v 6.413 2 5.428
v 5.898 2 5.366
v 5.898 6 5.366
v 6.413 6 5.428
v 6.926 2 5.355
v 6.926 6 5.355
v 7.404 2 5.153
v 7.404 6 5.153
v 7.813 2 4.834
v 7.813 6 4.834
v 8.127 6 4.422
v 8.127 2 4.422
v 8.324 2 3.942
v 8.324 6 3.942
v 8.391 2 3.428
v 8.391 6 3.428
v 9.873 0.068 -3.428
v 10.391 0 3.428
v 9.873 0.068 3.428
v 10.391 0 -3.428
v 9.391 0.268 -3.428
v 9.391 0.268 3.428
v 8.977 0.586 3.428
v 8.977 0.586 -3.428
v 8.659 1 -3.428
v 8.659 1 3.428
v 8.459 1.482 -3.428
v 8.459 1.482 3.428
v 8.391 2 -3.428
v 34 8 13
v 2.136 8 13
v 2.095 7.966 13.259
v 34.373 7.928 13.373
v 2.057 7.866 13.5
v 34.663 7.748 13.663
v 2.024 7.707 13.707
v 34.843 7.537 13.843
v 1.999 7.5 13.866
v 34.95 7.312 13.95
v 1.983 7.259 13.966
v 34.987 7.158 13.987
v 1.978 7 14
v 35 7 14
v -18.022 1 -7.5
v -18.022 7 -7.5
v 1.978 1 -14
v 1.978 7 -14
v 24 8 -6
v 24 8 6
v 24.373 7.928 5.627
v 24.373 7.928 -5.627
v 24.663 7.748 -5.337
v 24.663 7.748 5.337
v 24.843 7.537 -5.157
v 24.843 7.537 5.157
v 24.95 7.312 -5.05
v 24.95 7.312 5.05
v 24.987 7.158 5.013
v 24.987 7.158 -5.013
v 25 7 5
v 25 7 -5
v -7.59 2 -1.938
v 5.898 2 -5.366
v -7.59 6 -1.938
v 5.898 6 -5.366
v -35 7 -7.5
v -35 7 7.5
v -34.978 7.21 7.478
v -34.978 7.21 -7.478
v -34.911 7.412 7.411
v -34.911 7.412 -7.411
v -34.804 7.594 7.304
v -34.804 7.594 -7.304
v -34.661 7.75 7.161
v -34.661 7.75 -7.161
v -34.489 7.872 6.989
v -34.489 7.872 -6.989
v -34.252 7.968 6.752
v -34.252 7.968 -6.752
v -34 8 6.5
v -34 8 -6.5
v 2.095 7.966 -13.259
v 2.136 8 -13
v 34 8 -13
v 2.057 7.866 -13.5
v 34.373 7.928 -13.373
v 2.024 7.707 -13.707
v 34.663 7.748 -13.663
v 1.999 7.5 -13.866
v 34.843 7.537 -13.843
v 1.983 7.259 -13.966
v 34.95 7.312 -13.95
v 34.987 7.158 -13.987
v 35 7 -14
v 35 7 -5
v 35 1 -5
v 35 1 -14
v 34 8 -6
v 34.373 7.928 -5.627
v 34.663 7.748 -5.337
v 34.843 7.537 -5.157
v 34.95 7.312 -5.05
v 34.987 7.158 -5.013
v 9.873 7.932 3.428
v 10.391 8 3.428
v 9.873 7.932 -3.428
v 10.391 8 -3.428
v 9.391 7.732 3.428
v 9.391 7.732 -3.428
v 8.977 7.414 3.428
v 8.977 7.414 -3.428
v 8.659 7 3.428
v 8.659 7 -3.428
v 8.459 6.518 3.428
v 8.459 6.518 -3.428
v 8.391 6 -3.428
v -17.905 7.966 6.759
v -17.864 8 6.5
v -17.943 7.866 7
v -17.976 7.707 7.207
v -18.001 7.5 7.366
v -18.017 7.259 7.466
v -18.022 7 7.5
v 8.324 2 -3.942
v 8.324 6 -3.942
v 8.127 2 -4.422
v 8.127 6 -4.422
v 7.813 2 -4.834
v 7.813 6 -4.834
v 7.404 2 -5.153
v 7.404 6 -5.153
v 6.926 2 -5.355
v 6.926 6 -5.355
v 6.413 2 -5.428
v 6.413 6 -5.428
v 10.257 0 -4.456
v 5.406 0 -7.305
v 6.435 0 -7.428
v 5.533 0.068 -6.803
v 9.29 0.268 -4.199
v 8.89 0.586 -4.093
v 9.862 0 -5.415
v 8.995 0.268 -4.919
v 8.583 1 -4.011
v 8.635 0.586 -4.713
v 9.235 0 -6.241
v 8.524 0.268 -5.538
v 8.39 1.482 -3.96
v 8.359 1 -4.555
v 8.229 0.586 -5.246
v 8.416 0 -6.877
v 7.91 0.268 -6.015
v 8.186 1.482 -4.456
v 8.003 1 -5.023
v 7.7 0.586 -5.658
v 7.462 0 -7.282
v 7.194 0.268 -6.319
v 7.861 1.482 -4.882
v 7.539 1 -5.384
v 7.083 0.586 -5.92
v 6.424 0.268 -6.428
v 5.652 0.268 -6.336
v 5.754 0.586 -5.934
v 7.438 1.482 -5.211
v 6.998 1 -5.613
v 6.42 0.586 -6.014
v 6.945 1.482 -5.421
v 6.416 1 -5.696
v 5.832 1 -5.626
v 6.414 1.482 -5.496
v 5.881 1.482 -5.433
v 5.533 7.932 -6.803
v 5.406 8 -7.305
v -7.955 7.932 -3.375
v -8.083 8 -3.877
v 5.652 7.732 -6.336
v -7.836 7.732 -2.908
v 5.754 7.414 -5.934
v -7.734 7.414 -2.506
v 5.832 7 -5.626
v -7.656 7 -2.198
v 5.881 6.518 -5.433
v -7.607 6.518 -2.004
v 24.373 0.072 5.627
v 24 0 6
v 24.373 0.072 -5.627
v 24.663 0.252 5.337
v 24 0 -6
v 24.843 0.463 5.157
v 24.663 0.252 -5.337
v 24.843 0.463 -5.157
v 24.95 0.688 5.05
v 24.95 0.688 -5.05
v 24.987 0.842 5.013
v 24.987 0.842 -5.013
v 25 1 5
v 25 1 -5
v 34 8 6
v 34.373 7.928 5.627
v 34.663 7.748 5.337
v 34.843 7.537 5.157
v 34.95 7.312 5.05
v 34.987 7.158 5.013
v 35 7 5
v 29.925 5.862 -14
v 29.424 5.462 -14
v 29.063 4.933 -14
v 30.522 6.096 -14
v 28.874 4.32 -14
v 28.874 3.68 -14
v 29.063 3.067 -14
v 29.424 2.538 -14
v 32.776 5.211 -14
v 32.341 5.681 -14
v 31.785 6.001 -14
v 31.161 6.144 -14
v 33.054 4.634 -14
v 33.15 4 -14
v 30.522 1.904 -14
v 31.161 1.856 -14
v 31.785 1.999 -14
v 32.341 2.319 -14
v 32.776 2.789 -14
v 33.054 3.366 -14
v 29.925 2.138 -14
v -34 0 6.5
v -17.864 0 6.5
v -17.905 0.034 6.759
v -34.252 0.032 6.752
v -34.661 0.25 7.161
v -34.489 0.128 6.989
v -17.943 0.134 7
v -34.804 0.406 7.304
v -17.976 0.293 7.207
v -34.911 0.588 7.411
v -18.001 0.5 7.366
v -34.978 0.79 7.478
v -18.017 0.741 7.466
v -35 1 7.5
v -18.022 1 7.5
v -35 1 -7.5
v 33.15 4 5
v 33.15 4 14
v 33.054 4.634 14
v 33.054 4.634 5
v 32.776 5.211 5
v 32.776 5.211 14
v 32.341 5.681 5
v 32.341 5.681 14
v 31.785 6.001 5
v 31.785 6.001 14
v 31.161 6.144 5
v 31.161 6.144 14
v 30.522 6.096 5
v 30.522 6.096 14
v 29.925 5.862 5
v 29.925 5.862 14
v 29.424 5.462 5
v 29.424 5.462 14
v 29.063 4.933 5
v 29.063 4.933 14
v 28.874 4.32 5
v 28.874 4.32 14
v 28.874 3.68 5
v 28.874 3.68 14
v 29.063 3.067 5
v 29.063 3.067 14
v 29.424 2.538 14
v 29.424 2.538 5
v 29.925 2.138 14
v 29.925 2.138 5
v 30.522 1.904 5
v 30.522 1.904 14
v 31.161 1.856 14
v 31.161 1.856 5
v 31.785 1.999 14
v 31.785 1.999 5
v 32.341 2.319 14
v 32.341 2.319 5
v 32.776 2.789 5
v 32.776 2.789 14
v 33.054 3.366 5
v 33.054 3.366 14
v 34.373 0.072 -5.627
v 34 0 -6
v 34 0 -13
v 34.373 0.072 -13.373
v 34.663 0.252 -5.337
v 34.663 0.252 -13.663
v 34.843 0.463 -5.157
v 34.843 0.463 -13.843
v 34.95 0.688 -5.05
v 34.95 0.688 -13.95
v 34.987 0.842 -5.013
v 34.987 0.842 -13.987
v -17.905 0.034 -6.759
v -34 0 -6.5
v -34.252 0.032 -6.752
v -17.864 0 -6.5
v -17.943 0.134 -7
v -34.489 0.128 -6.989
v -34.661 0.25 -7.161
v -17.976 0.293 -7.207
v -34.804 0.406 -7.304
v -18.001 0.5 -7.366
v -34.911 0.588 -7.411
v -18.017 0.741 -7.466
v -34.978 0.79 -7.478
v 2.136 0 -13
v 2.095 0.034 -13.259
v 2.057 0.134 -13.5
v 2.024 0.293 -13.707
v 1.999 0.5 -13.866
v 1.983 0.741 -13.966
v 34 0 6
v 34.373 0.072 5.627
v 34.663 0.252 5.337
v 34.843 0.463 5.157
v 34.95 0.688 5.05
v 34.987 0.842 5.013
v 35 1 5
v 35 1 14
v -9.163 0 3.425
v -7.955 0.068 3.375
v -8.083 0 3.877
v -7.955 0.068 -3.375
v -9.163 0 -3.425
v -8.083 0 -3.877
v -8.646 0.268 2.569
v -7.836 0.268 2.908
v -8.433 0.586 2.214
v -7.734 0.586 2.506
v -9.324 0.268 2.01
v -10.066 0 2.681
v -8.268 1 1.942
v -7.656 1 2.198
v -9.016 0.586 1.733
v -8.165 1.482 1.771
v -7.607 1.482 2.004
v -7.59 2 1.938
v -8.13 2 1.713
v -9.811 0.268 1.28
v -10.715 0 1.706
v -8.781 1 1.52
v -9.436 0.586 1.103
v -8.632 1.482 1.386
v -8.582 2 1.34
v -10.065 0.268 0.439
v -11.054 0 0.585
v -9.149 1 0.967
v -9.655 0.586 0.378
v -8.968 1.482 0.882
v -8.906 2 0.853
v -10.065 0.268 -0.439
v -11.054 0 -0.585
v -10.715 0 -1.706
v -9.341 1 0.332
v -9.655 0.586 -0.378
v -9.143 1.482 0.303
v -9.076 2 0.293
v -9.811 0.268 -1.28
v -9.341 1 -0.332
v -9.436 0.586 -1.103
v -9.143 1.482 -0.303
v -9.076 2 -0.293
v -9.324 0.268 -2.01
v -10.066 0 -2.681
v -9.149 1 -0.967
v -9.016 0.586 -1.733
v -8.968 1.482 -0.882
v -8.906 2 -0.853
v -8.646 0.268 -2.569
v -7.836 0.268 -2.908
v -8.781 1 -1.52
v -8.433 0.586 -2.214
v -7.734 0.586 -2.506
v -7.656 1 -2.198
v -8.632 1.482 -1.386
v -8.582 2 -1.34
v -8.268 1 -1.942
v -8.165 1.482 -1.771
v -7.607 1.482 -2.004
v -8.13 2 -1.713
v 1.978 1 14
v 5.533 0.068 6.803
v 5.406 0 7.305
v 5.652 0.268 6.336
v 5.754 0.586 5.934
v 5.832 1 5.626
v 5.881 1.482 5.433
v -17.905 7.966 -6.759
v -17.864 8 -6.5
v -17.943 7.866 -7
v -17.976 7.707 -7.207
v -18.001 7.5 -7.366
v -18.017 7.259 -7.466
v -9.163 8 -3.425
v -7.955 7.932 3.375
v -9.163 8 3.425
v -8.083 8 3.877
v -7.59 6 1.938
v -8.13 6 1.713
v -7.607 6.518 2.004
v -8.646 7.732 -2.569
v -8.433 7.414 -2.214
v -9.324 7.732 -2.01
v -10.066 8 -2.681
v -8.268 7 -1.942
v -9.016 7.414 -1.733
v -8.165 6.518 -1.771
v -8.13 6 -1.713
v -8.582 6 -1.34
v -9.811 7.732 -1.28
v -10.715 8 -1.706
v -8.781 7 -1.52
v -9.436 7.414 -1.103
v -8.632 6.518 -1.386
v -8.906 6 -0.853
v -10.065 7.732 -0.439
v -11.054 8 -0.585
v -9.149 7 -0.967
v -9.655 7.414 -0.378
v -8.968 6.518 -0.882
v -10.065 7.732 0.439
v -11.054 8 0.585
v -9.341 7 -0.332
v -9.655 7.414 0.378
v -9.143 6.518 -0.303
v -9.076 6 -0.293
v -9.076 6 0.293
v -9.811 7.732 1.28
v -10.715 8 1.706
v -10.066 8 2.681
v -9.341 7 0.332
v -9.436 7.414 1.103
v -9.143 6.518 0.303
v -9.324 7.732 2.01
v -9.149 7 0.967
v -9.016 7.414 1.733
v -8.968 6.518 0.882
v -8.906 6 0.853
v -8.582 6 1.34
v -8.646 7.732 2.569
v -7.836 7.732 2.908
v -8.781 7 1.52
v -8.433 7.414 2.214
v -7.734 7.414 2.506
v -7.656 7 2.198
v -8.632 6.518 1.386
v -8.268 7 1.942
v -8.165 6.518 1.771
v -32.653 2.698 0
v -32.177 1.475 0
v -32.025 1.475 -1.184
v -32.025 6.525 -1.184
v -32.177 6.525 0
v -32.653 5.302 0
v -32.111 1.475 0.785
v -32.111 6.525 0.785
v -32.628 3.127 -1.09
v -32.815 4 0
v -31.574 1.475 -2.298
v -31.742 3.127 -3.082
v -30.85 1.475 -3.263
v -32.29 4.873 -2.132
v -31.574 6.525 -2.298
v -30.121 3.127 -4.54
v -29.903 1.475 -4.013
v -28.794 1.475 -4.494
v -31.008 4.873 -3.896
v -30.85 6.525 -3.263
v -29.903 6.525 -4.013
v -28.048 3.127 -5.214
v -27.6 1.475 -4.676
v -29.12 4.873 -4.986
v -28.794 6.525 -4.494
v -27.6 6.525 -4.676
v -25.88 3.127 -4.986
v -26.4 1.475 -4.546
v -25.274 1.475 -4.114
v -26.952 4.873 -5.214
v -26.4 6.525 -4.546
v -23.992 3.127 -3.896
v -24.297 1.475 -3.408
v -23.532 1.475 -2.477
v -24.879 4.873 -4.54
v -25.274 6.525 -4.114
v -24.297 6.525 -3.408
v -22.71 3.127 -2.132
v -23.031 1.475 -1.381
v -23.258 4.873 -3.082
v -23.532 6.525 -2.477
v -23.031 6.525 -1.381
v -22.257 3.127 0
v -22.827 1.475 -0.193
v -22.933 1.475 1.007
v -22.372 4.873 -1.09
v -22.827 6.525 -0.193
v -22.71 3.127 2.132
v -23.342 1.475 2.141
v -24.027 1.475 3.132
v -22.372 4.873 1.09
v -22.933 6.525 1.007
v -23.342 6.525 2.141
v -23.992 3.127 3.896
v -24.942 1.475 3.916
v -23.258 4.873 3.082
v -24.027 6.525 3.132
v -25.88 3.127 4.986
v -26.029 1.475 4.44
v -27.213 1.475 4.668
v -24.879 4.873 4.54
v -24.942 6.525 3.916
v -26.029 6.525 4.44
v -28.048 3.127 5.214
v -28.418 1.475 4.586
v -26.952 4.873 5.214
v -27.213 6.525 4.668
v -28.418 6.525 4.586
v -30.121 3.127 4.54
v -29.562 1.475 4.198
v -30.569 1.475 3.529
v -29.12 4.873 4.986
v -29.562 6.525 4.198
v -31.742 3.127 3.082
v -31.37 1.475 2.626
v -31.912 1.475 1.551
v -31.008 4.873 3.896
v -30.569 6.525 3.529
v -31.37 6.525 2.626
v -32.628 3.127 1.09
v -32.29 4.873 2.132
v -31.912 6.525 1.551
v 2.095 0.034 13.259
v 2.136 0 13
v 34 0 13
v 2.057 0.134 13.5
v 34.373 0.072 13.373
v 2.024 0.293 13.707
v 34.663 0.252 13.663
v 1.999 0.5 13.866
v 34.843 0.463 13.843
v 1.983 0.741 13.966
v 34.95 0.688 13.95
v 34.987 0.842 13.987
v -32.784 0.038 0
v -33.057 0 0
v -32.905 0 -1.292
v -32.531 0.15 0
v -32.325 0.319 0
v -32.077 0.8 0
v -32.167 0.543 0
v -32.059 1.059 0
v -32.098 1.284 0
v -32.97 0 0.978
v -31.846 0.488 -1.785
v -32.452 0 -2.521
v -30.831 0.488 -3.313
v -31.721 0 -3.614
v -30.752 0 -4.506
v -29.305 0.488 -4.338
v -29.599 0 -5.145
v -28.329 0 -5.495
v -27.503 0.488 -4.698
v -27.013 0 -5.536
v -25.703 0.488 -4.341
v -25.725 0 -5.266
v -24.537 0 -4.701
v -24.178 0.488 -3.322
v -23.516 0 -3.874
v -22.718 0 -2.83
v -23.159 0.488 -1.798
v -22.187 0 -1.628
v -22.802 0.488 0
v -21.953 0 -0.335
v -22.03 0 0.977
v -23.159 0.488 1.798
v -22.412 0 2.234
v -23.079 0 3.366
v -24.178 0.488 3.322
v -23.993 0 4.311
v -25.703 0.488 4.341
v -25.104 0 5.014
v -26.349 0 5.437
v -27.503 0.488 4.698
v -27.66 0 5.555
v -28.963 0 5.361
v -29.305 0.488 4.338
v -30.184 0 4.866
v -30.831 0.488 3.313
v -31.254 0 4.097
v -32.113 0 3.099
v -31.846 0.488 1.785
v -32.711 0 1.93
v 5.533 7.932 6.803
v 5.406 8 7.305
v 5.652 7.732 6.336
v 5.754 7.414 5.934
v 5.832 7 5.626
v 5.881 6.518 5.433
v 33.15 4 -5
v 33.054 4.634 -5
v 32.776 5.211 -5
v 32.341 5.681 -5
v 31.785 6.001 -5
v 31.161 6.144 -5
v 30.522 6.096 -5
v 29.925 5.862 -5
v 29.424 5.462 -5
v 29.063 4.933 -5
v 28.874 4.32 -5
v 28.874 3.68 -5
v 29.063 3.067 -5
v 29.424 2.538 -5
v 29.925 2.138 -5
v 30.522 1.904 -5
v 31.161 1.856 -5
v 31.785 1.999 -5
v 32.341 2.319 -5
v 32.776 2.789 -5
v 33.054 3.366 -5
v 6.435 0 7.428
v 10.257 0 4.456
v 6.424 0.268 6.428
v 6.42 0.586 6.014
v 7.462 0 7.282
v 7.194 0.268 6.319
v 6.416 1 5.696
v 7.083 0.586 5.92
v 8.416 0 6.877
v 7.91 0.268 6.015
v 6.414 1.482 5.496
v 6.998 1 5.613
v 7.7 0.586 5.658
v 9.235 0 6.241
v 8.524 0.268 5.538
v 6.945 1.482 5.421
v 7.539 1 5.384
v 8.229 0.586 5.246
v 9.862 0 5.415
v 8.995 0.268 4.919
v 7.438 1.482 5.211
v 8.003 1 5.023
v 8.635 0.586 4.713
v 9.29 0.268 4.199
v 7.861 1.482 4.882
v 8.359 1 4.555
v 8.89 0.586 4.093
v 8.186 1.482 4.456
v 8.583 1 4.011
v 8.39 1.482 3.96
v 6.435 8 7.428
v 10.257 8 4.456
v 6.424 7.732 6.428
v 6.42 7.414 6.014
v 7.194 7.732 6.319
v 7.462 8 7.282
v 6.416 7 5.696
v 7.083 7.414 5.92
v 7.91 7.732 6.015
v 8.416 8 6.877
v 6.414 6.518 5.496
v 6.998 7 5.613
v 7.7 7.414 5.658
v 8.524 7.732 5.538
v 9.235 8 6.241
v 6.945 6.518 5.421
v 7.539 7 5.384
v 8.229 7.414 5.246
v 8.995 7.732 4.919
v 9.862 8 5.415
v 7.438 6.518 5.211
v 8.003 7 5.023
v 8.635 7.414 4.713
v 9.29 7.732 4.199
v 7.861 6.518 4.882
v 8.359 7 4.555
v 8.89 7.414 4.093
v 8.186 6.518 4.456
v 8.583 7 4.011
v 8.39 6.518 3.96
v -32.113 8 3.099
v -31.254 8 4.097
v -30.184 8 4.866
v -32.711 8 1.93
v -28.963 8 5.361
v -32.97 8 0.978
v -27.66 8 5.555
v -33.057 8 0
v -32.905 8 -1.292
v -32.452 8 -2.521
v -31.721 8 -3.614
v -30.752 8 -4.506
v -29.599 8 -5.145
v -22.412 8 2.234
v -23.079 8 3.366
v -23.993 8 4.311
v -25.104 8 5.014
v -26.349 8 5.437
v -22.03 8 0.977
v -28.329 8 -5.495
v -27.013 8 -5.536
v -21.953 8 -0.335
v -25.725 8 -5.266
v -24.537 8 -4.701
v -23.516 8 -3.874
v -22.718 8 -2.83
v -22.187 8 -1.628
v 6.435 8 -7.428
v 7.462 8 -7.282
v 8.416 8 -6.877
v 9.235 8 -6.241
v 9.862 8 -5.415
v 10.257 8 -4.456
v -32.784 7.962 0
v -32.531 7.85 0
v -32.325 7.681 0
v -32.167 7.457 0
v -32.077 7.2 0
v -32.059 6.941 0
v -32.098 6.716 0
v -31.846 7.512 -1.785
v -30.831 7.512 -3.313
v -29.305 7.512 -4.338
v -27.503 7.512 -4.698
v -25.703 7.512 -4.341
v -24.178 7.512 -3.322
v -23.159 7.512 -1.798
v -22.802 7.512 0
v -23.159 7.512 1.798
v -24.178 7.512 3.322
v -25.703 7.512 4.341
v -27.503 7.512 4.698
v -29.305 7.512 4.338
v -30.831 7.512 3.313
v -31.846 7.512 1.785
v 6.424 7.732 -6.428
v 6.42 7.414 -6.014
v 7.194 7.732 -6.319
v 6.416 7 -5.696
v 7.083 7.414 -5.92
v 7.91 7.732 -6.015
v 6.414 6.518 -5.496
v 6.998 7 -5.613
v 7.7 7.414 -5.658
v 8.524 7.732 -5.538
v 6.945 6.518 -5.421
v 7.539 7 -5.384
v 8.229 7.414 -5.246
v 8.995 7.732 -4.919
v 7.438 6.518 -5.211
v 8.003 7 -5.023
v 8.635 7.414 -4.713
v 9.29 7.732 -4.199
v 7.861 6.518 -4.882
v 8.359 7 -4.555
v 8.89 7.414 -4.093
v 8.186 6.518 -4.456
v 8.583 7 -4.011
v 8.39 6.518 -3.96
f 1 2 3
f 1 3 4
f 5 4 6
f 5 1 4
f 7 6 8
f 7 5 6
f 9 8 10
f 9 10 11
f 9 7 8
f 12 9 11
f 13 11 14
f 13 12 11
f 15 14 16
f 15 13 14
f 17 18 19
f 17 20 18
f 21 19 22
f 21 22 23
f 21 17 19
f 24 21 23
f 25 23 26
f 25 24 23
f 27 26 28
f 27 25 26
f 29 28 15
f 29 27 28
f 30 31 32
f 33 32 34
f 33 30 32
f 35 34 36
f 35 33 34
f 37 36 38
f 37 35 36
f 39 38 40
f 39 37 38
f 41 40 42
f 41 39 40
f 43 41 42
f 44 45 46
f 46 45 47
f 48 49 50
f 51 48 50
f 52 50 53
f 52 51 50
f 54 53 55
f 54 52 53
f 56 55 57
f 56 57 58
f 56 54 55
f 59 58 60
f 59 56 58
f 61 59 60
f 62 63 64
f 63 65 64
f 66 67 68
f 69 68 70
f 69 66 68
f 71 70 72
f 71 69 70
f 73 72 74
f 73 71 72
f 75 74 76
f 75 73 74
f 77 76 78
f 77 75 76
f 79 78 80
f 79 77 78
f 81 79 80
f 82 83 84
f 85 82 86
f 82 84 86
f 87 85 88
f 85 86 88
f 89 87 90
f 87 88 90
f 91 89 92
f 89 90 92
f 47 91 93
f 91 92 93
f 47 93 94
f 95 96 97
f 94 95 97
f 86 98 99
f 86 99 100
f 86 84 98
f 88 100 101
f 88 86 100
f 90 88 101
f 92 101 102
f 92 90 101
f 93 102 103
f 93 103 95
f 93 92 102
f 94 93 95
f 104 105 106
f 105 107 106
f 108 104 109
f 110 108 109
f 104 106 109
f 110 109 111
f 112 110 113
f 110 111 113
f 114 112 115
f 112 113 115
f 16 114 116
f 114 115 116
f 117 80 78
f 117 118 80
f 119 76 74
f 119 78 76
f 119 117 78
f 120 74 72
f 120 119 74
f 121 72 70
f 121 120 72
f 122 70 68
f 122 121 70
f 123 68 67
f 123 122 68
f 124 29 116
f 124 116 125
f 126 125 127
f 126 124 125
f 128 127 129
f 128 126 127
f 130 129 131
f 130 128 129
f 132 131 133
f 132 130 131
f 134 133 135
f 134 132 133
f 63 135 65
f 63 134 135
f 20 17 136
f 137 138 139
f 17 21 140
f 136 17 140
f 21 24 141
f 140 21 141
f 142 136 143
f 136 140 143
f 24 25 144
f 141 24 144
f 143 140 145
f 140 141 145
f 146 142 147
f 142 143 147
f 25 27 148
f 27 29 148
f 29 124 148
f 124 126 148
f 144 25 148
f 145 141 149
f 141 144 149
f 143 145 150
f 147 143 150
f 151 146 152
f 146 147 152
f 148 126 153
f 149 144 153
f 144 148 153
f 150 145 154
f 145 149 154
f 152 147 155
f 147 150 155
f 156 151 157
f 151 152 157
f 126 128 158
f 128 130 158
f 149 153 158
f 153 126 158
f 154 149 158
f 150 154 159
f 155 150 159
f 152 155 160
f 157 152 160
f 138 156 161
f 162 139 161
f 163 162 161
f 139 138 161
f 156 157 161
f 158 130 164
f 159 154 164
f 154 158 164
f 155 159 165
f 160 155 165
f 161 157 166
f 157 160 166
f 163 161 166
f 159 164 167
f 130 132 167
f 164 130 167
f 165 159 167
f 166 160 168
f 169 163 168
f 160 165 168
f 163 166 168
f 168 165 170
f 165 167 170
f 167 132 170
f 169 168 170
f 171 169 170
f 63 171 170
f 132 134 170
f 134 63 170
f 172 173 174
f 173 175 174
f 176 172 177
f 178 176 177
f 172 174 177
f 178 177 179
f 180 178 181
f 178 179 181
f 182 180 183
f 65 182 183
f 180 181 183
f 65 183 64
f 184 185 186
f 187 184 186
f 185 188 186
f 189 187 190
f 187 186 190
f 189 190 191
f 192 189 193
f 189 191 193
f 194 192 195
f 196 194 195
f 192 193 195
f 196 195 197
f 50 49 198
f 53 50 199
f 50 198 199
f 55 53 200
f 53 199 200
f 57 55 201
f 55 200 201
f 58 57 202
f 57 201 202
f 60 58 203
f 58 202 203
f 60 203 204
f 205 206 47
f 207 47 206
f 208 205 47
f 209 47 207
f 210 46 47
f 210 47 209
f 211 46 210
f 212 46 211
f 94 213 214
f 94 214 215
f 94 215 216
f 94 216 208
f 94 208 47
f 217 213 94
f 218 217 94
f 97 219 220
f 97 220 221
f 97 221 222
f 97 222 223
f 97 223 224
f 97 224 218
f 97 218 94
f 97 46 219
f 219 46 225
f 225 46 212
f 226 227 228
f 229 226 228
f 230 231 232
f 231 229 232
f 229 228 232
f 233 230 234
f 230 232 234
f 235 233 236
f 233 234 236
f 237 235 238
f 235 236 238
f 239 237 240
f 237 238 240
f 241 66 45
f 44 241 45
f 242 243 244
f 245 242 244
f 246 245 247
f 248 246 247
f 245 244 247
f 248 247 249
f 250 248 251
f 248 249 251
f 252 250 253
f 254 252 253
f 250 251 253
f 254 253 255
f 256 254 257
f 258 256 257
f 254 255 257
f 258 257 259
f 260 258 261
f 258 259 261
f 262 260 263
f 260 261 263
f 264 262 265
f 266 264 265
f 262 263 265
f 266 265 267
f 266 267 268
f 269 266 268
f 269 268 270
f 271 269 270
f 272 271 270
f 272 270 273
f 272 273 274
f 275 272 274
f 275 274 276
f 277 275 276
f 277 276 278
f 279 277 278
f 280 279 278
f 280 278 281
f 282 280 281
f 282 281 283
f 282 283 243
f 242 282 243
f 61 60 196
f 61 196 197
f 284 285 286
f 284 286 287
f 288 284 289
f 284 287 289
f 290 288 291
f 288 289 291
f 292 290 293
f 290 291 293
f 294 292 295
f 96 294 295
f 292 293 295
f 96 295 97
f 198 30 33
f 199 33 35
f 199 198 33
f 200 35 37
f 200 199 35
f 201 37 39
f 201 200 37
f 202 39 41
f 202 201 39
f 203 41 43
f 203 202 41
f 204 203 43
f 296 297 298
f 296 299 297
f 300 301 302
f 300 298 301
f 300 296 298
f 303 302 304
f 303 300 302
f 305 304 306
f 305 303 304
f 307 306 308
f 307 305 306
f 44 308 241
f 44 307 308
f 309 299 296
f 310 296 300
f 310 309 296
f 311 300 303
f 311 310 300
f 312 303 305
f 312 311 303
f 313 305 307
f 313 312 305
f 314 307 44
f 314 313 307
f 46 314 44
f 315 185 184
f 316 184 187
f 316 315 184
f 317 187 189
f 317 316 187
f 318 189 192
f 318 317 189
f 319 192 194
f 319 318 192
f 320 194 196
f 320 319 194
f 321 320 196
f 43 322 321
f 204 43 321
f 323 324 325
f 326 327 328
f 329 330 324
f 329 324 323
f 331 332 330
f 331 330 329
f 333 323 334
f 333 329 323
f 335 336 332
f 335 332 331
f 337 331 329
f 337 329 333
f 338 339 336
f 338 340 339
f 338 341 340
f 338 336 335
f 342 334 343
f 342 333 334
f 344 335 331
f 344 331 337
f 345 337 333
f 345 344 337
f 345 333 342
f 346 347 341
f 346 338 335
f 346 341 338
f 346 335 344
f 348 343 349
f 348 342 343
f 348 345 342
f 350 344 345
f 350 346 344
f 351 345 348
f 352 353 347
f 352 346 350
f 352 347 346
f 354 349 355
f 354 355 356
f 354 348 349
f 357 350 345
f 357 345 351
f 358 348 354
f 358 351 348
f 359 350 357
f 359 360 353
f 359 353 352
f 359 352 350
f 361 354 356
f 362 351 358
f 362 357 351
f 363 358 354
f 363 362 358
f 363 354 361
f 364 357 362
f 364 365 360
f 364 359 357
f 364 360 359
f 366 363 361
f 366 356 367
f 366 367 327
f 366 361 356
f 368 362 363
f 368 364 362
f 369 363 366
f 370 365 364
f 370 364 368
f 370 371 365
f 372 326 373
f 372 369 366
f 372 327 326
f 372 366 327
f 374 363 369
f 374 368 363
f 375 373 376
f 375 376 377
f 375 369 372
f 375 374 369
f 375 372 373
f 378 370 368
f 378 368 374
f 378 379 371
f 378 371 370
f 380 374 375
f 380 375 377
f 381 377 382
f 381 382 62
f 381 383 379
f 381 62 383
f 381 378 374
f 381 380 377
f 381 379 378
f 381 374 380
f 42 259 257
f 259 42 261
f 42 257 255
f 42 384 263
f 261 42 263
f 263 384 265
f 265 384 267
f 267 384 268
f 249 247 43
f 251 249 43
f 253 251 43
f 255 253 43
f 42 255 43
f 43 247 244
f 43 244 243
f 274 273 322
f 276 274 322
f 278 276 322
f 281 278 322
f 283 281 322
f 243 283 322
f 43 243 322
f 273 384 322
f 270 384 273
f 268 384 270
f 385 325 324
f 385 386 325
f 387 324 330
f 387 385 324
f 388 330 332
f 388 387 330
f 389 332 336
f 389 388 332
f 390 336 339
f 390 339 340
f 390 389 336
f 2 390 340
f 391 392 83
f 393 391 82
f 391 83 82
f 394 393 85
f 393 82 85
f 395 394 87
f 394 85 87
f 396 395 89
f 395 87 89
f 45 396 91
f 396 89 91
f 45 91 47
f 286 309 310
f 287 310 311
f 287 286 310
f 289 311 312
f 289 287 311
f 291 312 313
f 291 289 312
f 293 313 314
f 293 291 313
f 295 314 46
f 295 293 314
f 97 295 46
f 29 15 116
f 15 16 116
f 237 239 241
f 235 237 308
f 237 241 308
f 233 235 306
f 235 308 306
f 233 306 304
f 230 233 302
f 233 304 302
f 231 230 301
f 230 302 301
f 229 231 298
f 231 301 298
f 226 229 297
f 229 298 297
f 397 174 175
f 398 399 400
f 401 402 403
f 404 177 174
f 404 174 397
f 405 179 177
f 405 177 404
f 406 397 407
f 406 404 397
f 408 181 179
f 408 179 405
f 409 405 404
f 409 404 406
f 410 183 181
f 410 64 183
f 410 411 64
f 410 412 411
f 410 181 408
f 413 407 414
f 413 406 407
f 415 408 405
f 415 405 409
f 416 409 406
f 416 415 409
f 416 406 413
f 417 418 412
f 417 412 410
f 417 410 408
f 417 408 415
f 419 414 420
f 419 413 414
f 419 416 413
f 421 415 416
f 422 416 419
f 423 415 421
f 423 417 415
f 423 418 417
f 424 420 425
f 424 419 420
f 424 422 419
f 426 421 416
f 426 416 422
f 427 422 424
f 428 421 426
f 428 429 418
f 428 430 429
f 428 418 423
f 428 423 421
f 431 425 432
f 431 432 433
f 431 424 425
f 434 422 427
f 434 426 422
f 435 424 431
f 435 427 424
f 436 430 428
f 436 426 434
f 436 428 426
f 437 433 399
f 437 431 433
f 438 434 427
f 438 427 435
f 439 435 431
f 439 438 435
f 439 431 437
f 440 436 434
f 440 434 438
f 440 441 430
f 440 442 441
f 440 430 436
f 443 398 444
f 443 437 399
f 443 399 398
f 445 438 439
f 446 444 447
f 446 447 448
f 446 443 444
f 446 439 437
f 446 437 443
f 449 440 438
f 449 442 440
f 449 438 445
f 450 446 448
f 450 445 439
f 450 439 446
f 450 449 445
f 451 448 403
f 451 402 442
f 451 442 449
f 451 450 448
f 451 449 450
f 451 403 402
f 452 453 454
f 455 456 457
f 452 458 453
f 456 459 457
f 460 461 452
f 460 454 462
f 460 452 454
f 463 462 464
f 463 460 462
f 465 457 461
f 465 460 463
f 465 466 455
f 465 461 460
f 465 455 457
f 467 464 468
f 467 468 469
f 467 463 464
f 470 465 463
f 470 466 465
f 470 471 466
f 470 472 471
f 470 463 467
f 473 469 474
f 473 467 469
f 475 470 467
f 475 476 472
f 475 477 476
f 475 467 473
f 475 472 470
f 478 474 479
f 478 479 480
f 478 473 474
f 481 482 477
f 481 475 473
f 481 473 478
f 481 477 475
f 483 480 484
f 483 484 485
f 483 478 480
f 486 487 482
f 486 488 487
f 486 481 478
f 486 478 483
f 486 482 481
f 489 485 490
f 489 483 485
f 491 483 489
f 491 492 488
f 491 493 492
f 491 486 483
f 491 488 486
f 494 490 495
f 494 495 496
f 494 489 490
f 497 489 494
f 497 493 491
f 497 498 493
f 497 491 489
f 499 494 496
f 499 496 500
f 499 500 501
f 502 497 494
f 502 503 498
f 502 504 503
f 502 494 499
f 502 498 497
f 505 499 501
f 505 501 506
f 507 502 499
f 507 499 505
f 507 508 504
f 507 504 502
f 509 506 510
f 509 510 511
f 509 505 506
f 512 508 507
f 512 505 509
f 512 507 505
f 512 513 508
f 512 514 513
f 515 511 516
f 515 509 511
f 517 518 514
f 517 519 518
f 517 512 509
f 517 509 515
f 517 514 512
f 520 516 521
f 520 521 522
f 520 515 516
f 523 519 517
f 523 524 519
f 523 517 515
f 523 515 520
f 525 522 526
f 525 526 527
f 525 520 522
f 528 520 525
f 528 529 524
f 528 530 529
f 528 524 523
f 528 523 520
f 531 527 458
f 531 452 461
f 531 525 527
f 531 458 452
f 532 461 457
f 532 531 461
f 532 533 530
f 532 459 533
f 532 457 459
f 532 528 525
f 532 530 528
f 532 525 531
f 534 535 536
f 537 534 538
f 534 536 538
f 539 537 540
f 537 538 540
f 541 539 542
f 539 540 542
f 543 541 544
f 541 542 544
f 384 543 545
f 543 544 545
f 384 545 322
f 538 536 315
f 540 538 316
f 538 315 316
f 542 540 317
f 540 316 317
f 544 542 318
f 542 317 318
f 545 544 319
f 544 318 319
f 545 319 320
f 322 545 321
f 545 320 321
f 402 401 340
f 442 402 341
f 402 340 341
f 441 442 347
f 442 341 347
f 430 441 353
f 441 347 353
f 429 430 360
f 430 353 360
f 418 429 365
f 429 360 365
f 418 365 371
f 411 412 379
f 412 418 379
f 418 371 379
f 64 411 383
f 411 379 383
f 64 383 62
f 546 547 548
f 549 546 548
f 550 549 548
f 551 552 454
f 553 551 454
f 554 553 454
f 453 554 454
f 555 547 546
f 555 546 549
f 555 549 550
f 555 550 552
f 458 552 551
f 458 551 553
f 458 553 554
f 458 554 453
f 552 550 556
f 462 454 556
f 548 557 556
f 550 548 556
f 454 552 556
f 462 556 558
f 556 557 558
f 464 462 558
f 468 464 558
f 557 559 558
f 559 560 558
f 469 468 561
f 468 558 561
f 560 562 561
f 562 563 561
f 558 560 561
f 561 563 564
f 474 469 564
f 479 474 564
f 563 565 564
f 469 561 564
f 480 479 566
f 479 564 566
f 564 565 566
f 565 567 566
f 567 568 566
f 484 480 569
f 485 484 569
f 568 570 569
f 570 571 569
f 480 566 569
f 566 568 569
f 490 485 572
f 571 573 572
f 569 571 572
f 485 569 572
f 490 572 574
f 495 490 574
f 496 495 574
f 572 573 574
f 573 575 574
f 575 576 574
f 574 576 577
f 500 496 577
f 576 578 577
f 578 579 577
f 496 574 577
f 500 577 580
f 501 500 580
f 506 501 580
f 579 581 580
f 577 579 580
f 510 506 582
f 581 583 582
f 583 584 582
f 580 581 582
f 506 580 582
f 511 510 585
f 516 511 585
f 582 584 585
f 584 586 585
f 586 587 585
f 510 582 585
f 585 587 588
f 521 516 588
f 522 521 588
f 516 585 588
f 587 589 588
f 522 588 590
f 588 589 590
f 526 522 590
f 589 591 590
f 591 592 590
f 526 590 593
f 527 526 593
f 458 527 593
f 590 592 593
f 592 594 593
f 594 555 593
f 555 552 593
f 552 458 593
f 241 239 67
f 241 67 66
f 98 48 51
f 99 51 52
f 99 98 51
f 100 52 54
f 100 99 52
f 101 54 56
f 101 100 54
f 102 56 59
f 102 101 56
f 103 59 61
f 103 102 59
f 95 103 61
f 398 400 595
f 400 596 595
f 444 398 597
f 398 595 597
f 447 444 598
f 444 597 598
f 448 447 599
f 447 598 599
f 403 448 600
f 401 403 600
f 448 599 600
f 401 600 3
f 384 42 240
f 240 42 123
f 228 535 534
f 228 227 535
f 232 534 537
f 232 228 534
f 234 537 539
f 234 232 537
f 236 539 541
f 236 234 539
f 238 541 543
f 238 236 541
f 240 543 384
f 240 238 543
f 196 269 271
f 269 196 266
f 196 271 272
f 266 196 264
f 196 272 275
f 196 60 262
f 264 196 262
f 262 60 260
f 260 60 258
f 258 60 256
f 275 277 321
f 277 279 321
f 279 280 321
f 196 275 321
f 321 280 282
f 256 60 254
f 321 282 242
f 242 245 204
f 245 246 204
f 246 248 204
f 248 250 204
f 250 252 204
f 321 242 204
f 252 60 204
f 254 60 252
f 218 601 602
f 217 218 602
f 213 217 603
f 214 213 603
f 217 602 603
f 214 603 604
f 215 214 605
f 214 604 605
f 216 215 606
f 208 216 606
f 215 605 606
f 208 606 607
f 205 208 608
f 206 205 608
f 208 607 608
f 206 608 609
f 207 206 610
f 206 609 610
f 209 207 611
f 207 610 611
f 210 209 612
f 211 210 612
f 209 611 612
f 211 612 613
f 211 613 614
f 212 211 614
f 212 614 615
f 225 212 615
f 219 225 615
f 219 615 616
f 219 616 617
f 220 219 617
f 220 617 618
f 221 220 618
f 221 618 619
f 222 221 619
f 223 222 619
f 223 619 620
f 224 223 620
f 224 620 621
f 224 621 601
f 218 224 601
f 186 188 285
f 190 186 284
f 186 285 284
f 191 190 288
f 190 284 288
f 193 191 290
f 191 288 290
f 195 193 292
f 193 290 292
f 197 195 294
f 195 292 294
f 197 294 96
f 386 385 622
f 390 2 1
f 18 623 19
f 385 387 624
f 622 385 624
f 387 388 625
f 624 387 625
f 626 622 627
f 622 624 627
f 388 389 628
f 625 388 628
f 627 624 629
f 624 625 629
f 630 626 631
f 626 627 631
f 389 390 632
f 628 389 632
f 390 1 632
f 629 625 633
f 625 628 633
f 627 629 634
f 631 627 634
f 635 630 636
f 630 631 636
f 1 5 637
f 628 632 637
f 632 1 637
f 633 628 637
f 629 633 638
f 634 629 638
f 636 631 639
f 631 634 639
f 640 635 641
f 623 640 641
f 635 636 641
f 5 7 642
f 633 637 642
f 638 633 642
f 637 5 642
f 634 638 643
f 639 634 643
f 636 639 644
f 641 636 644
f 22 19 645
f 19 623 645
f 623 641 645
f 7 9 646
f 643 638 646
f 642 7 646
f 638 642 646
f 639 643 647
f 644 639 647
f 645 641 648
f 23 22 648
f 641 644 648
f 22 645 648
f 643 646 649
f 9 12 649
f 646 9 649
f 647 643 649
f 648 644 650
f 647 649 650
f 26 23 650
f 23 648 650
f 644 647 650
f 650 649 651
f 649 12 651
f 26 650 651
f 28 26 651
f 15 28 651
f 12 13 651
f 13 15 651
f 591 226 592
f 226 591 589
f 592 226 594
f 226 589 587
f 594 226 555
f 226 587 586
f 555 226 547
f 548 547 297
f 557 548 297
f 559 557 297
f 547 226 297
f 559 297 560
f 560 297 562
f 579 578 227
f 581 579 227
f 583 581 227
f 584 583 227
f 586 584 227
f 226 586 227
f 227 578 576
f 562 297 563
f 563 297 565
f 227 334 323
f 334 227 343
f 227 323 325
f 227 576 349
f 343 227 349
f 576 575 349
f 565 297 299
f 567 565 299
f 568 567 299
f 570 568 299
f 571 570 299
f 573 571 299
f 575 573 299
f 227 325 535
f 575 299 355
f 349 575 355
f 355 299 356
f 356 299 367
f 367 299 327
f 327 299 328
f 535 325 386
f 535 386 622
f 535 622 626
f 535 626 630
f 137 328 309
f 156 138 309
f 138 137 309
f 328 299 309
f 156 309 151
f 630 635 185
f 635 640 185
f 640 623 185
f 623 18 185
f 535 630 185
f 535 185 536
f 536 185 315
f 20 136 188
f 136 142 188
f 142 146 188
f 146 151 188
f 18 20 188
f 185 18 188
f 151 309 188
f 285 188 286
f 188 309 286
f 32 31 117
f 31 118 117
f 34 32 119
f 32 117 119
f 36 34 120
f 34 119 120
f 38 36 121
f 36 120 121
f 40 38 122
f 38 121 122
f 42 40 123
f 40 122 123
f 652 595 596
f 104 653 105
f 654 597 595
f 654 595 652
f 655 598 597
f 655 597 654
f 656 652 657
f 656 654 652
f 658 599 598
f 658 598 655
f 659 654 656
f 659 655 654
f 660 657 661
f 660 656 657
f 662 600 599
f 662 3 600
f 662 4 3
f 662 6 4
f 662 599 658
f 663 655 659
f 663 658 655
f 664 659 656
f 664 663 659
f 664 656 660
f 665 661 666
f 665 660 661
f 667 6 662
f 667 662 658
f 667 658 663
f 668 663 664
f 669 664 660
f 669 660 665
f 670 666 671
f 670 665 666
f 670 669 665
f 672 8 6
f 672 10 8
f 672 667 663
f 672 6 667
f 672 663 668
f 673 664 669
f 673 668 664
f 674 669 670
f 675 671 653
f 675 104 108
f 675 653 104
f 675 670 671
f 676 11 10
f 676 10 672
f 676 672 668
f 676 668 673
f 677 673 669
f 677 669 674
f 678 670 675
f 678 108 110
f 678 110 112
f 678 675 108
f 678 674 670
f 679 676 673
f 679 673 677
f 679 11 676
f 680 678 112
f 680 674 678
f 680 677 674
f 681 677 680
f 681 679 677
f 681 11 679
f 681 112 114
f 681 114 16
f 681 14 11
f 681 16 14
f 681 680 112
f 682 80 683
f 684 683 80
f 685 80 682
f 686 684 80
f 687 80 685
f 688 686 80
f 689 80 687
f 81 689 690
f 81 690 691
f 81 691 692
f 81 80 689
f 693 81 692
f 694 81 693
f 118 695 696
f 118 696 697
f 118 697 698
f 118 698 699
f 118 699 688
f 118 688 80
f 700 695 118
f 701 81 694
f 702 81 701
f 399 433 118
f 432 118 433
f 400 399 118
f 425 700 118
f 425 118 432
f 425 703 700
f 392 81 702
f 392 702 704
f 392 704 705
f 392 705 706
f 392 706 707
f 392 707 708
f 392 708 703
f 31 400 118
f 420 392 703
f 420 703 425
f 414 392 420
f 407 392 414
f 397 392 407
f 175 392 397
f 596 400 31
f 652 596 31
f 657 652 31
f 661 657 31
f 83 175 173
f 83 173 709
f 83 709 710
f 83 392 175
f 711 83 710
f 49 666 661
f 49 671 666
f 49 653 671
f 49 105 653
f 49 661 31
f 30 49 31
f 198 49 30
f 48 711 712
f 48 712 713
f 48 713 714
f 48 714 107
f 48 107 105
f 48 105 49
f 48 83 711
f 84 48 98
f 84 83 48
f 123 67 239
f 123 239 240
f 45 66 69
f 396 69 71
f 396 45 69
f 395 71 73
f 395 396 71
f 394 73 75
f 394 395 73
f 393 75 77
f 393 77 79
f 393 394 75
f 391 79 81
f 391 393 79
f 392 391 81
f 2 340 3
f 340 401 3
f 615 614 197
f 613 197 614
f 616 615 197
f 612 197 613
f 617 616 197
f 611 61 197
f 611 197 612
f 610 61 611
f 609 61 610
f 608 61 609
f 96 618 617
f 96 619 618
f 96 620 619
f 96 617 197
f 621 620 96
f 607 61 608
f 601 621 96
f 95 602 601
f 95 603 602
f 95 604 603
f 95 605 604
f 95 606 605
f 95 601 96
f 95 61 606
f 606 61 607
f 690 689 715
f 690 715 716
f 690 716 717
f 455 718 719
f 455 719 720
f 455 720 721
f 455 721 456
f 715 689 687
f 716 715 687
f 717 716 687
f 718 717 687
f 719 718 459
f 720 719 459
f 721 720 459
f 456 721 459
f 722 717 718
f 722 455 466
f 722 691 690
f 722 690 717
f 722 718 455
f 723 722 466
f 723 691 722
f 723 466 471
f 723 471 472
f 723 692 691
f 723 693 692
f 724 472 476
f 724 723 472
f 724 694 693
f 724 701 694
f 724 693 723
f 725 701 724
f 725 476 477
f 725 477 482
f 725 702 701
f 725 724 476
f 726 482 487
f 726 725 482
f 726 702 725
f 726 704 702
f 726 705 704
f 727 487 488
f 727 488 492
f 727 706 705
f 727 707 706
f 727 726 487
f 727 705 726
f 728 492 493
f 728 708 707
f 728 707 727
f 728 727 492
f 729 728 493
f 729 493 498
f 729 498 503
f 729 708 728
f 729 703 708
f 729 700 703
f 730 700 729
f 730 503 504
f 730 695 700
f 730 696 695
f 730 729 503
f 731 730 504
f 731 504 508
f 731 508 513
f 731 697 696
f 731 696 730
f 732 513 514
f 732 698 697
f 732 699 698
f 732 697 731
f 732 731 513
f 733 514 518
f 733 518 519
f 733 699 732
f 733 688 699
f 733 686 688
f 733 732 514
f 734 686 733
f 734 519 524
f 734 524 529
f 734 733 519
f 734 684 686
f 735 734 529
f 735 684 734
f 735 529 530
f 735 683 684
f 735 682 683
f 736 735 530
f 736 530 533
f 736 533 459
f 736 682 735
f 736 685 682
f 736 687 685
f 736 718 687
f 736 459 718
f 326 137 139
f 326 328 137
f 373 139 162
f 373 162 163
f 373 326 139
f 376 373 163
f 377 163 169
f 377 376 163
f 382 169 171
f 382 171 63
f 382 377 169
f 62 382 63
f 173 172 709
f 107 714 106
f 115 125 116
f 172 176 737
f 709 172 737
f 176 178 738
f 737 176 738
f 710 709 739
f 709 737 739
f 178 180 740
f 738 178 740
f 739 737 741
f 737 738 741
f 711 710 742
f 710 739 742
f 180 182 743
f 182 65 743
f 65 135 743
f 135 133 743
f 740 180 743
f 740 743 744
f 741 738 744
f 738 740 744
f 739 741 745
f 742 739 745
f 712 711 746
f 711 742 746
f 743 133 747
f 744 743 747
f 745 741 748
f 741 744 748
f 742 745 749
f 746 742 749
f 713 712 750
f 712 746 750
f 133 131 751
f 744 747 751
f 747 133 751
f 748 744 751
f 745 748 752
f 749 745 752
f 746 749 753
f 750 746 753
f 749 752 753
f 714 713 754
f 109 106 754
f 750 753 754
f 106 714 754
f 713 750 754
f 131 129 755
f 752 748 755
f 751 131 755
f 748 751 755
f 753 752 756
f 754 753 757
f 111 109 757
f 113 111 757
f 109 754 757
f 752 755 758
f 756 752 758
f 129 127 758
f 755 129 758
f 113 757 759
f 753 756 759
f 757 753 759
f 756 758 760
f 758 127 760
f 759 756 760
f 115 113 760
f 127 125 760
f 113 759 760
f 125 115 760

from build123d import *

# Parameters (mm, degrees)
SKETCH1_W           = 70
SKETCH1_H           = 28
BOSS_EXTRUDE1_DEPTH = 8
SKETCH2_W           = 10
SKETCH2_H           = 10
CUT_EXTRUDE1_DEPTH  = 10
SKETCH3_R           = 2.15
CUT_EXTRUDE2_DEPTH  = 46.530209751
SKETCH5_W           = 16.977623655
SKETCH5_H           = 6.5
CUT_EXTRUDE4_DEPTH  = 39.535697736
FILLET1_R           = 1
CUT_EXTRUDE5_DEPTH  = 10
FILLET2_R           = 2


with BuildPart() as part:
    # Sketch1 → Boss-Extrude1 (new body)
    with BuildSketch(Plane(origin=(0, 0, 0), x_dir=(1, 0, 0), z_dir=(0, 1, 0))):
        Rectangle(SKETCH1_W, SKETCH1_H)
    extrude(amount=BOSS_EXTRUDE1_DEPTH)

    # Sketch2 → Cut-Extrude1 (cut)
    with BuildSketch(Plane(origin=(0, 8, 0), x_dir=(1, 0, 0), z_dir=(0, 1, 0))):
        with Locations((30, 0)):
            Rectangle(SKETCH2_W, SKETCH2_H)
    extrude(amount=-CUT_EXTRUDE1_DEPTH, mode=Mode.SUBTRACT)

    # Sketch3 → Cut-Extrude2 (cut, through all)
    with BuildSketch(Plane.XY.offset(14)):
        with Locations((31, 4)):
            Circle(SKETCH3_R)
    extrude(amount=-CUT_EXTRUDE2_DEPTH, mode=Mode.SUBTRACT)

    # Sketch5 → Cut-Extrude4 (cut, through all)
    with BuildSketch(Plane(origin=(0, 8, 0), x_dir=(1, 0, 0), z_dir=(0, 1, 0))):
        with Locations((-26.511188172, 10.75)):
            Rectangle(SKETCH5_W, SKETCH5_H)
        Polygon((-18.022376345, 14), (-18.022376345, 7.5), (1.977623655, 14), align=None)
        Polygon((1.977623655, -14), (-18.022376345, -7.5), (-18.022376345, -14), align=None)
        with Locations((-26.511188172, -10.75)):
            Rectangle(SKETCH5_W, SKETCH5_H)
    extrude(amount=-CUT_EXTRUDE4_DEPTH, mode=Mode.SUBTRACT)

    # Sketch6 → Cut-Revolve1 (revolve, cut)
    with BuildSketch(Plane.XY):
        with BuildLine():
            Line((-31, 8), (-27.5, 8))
            Line((-27.5, 8), (-27.5, 0))
            Line((-27.5, 0), (-31, 0))
            ThreePointArc((-31, 0), (-32.815072906, 4), (-31, 8))
        make_face()
    revolve(axis=Axis((-27.5, 8, 0), (0, -1, 0)), mode=Mode.SUBTRACT)

    # Fillet1
    fillet1_edges = [part.edges().sort_by_distance(p)[0] for p in [
        (35, 0, -9.5),
        (30, 0, -5),
        (25, 0, 0),
        (30, 0, 5),
        (35, 8, -9.5),
        (30, 8, -5),
        (25, 8, 0),
        (30, 8, 5),
        (18.488811828, 0, 14),
        (-35, 0, 0),
        (-35, 8, 0),
        (18.488811828, 8, 14),
        (35, 8, 9.5),
        (-26.511188172, 0, -7.5),
        (-8.022376345, 0, -10.75),
        (-26.511188172, 8, -7.5),
        (-8.022376345, 8, -10.75),
        (18.488811828, 0, -14),
        (-8.022376345, 8, 10.75),
        (-26.511188172, 8, 7.5),
        (-8.022376345, 0, 10.75),
        (35, 0, 9.5),
        (-26.511188172, 0, 7.5),
        (-24, 0, 0),
        (-24, 8, 0),
        (18.488811828, 8, -14),
    ]]
    fillet(fillet1_edges, radius=FILLET1_R)

    # Sketch7 → Cut-Extrude5 (cut)
    with BuildSketch(Plane(origin=(0, 8, 0), x_dir=(1, 0, 0), z_dir=(0, 1, 0))):
        Polygon((-15.216541459, 0), (8.390933297, -6), (8.390933297, 6), align=None)
    extrude(amount=-CUT_EXTRUDE5_DEPTH, mode=Mode.SUBTRACT)

    # Fillet2
    fillet2_edges = [part.edges().sort_by_distance(p)[0] for p in [
        (-3.412804081, 0, 3),
        (8.390933297, 0, 0),
        (-3.412804081, 0, -3),
        (-15.216541459, 4, 0),
        (8.390933297, 4, -6),
        (8.390933297, 4, 6),
        (-3.412804081, 8, -3),
        (-3.412804081, 8, 3),
        (8.390933297, 8, 0),
    ]]
    fillet(fillet2_edges, radius=FILLET2_R)


solid = part.part
